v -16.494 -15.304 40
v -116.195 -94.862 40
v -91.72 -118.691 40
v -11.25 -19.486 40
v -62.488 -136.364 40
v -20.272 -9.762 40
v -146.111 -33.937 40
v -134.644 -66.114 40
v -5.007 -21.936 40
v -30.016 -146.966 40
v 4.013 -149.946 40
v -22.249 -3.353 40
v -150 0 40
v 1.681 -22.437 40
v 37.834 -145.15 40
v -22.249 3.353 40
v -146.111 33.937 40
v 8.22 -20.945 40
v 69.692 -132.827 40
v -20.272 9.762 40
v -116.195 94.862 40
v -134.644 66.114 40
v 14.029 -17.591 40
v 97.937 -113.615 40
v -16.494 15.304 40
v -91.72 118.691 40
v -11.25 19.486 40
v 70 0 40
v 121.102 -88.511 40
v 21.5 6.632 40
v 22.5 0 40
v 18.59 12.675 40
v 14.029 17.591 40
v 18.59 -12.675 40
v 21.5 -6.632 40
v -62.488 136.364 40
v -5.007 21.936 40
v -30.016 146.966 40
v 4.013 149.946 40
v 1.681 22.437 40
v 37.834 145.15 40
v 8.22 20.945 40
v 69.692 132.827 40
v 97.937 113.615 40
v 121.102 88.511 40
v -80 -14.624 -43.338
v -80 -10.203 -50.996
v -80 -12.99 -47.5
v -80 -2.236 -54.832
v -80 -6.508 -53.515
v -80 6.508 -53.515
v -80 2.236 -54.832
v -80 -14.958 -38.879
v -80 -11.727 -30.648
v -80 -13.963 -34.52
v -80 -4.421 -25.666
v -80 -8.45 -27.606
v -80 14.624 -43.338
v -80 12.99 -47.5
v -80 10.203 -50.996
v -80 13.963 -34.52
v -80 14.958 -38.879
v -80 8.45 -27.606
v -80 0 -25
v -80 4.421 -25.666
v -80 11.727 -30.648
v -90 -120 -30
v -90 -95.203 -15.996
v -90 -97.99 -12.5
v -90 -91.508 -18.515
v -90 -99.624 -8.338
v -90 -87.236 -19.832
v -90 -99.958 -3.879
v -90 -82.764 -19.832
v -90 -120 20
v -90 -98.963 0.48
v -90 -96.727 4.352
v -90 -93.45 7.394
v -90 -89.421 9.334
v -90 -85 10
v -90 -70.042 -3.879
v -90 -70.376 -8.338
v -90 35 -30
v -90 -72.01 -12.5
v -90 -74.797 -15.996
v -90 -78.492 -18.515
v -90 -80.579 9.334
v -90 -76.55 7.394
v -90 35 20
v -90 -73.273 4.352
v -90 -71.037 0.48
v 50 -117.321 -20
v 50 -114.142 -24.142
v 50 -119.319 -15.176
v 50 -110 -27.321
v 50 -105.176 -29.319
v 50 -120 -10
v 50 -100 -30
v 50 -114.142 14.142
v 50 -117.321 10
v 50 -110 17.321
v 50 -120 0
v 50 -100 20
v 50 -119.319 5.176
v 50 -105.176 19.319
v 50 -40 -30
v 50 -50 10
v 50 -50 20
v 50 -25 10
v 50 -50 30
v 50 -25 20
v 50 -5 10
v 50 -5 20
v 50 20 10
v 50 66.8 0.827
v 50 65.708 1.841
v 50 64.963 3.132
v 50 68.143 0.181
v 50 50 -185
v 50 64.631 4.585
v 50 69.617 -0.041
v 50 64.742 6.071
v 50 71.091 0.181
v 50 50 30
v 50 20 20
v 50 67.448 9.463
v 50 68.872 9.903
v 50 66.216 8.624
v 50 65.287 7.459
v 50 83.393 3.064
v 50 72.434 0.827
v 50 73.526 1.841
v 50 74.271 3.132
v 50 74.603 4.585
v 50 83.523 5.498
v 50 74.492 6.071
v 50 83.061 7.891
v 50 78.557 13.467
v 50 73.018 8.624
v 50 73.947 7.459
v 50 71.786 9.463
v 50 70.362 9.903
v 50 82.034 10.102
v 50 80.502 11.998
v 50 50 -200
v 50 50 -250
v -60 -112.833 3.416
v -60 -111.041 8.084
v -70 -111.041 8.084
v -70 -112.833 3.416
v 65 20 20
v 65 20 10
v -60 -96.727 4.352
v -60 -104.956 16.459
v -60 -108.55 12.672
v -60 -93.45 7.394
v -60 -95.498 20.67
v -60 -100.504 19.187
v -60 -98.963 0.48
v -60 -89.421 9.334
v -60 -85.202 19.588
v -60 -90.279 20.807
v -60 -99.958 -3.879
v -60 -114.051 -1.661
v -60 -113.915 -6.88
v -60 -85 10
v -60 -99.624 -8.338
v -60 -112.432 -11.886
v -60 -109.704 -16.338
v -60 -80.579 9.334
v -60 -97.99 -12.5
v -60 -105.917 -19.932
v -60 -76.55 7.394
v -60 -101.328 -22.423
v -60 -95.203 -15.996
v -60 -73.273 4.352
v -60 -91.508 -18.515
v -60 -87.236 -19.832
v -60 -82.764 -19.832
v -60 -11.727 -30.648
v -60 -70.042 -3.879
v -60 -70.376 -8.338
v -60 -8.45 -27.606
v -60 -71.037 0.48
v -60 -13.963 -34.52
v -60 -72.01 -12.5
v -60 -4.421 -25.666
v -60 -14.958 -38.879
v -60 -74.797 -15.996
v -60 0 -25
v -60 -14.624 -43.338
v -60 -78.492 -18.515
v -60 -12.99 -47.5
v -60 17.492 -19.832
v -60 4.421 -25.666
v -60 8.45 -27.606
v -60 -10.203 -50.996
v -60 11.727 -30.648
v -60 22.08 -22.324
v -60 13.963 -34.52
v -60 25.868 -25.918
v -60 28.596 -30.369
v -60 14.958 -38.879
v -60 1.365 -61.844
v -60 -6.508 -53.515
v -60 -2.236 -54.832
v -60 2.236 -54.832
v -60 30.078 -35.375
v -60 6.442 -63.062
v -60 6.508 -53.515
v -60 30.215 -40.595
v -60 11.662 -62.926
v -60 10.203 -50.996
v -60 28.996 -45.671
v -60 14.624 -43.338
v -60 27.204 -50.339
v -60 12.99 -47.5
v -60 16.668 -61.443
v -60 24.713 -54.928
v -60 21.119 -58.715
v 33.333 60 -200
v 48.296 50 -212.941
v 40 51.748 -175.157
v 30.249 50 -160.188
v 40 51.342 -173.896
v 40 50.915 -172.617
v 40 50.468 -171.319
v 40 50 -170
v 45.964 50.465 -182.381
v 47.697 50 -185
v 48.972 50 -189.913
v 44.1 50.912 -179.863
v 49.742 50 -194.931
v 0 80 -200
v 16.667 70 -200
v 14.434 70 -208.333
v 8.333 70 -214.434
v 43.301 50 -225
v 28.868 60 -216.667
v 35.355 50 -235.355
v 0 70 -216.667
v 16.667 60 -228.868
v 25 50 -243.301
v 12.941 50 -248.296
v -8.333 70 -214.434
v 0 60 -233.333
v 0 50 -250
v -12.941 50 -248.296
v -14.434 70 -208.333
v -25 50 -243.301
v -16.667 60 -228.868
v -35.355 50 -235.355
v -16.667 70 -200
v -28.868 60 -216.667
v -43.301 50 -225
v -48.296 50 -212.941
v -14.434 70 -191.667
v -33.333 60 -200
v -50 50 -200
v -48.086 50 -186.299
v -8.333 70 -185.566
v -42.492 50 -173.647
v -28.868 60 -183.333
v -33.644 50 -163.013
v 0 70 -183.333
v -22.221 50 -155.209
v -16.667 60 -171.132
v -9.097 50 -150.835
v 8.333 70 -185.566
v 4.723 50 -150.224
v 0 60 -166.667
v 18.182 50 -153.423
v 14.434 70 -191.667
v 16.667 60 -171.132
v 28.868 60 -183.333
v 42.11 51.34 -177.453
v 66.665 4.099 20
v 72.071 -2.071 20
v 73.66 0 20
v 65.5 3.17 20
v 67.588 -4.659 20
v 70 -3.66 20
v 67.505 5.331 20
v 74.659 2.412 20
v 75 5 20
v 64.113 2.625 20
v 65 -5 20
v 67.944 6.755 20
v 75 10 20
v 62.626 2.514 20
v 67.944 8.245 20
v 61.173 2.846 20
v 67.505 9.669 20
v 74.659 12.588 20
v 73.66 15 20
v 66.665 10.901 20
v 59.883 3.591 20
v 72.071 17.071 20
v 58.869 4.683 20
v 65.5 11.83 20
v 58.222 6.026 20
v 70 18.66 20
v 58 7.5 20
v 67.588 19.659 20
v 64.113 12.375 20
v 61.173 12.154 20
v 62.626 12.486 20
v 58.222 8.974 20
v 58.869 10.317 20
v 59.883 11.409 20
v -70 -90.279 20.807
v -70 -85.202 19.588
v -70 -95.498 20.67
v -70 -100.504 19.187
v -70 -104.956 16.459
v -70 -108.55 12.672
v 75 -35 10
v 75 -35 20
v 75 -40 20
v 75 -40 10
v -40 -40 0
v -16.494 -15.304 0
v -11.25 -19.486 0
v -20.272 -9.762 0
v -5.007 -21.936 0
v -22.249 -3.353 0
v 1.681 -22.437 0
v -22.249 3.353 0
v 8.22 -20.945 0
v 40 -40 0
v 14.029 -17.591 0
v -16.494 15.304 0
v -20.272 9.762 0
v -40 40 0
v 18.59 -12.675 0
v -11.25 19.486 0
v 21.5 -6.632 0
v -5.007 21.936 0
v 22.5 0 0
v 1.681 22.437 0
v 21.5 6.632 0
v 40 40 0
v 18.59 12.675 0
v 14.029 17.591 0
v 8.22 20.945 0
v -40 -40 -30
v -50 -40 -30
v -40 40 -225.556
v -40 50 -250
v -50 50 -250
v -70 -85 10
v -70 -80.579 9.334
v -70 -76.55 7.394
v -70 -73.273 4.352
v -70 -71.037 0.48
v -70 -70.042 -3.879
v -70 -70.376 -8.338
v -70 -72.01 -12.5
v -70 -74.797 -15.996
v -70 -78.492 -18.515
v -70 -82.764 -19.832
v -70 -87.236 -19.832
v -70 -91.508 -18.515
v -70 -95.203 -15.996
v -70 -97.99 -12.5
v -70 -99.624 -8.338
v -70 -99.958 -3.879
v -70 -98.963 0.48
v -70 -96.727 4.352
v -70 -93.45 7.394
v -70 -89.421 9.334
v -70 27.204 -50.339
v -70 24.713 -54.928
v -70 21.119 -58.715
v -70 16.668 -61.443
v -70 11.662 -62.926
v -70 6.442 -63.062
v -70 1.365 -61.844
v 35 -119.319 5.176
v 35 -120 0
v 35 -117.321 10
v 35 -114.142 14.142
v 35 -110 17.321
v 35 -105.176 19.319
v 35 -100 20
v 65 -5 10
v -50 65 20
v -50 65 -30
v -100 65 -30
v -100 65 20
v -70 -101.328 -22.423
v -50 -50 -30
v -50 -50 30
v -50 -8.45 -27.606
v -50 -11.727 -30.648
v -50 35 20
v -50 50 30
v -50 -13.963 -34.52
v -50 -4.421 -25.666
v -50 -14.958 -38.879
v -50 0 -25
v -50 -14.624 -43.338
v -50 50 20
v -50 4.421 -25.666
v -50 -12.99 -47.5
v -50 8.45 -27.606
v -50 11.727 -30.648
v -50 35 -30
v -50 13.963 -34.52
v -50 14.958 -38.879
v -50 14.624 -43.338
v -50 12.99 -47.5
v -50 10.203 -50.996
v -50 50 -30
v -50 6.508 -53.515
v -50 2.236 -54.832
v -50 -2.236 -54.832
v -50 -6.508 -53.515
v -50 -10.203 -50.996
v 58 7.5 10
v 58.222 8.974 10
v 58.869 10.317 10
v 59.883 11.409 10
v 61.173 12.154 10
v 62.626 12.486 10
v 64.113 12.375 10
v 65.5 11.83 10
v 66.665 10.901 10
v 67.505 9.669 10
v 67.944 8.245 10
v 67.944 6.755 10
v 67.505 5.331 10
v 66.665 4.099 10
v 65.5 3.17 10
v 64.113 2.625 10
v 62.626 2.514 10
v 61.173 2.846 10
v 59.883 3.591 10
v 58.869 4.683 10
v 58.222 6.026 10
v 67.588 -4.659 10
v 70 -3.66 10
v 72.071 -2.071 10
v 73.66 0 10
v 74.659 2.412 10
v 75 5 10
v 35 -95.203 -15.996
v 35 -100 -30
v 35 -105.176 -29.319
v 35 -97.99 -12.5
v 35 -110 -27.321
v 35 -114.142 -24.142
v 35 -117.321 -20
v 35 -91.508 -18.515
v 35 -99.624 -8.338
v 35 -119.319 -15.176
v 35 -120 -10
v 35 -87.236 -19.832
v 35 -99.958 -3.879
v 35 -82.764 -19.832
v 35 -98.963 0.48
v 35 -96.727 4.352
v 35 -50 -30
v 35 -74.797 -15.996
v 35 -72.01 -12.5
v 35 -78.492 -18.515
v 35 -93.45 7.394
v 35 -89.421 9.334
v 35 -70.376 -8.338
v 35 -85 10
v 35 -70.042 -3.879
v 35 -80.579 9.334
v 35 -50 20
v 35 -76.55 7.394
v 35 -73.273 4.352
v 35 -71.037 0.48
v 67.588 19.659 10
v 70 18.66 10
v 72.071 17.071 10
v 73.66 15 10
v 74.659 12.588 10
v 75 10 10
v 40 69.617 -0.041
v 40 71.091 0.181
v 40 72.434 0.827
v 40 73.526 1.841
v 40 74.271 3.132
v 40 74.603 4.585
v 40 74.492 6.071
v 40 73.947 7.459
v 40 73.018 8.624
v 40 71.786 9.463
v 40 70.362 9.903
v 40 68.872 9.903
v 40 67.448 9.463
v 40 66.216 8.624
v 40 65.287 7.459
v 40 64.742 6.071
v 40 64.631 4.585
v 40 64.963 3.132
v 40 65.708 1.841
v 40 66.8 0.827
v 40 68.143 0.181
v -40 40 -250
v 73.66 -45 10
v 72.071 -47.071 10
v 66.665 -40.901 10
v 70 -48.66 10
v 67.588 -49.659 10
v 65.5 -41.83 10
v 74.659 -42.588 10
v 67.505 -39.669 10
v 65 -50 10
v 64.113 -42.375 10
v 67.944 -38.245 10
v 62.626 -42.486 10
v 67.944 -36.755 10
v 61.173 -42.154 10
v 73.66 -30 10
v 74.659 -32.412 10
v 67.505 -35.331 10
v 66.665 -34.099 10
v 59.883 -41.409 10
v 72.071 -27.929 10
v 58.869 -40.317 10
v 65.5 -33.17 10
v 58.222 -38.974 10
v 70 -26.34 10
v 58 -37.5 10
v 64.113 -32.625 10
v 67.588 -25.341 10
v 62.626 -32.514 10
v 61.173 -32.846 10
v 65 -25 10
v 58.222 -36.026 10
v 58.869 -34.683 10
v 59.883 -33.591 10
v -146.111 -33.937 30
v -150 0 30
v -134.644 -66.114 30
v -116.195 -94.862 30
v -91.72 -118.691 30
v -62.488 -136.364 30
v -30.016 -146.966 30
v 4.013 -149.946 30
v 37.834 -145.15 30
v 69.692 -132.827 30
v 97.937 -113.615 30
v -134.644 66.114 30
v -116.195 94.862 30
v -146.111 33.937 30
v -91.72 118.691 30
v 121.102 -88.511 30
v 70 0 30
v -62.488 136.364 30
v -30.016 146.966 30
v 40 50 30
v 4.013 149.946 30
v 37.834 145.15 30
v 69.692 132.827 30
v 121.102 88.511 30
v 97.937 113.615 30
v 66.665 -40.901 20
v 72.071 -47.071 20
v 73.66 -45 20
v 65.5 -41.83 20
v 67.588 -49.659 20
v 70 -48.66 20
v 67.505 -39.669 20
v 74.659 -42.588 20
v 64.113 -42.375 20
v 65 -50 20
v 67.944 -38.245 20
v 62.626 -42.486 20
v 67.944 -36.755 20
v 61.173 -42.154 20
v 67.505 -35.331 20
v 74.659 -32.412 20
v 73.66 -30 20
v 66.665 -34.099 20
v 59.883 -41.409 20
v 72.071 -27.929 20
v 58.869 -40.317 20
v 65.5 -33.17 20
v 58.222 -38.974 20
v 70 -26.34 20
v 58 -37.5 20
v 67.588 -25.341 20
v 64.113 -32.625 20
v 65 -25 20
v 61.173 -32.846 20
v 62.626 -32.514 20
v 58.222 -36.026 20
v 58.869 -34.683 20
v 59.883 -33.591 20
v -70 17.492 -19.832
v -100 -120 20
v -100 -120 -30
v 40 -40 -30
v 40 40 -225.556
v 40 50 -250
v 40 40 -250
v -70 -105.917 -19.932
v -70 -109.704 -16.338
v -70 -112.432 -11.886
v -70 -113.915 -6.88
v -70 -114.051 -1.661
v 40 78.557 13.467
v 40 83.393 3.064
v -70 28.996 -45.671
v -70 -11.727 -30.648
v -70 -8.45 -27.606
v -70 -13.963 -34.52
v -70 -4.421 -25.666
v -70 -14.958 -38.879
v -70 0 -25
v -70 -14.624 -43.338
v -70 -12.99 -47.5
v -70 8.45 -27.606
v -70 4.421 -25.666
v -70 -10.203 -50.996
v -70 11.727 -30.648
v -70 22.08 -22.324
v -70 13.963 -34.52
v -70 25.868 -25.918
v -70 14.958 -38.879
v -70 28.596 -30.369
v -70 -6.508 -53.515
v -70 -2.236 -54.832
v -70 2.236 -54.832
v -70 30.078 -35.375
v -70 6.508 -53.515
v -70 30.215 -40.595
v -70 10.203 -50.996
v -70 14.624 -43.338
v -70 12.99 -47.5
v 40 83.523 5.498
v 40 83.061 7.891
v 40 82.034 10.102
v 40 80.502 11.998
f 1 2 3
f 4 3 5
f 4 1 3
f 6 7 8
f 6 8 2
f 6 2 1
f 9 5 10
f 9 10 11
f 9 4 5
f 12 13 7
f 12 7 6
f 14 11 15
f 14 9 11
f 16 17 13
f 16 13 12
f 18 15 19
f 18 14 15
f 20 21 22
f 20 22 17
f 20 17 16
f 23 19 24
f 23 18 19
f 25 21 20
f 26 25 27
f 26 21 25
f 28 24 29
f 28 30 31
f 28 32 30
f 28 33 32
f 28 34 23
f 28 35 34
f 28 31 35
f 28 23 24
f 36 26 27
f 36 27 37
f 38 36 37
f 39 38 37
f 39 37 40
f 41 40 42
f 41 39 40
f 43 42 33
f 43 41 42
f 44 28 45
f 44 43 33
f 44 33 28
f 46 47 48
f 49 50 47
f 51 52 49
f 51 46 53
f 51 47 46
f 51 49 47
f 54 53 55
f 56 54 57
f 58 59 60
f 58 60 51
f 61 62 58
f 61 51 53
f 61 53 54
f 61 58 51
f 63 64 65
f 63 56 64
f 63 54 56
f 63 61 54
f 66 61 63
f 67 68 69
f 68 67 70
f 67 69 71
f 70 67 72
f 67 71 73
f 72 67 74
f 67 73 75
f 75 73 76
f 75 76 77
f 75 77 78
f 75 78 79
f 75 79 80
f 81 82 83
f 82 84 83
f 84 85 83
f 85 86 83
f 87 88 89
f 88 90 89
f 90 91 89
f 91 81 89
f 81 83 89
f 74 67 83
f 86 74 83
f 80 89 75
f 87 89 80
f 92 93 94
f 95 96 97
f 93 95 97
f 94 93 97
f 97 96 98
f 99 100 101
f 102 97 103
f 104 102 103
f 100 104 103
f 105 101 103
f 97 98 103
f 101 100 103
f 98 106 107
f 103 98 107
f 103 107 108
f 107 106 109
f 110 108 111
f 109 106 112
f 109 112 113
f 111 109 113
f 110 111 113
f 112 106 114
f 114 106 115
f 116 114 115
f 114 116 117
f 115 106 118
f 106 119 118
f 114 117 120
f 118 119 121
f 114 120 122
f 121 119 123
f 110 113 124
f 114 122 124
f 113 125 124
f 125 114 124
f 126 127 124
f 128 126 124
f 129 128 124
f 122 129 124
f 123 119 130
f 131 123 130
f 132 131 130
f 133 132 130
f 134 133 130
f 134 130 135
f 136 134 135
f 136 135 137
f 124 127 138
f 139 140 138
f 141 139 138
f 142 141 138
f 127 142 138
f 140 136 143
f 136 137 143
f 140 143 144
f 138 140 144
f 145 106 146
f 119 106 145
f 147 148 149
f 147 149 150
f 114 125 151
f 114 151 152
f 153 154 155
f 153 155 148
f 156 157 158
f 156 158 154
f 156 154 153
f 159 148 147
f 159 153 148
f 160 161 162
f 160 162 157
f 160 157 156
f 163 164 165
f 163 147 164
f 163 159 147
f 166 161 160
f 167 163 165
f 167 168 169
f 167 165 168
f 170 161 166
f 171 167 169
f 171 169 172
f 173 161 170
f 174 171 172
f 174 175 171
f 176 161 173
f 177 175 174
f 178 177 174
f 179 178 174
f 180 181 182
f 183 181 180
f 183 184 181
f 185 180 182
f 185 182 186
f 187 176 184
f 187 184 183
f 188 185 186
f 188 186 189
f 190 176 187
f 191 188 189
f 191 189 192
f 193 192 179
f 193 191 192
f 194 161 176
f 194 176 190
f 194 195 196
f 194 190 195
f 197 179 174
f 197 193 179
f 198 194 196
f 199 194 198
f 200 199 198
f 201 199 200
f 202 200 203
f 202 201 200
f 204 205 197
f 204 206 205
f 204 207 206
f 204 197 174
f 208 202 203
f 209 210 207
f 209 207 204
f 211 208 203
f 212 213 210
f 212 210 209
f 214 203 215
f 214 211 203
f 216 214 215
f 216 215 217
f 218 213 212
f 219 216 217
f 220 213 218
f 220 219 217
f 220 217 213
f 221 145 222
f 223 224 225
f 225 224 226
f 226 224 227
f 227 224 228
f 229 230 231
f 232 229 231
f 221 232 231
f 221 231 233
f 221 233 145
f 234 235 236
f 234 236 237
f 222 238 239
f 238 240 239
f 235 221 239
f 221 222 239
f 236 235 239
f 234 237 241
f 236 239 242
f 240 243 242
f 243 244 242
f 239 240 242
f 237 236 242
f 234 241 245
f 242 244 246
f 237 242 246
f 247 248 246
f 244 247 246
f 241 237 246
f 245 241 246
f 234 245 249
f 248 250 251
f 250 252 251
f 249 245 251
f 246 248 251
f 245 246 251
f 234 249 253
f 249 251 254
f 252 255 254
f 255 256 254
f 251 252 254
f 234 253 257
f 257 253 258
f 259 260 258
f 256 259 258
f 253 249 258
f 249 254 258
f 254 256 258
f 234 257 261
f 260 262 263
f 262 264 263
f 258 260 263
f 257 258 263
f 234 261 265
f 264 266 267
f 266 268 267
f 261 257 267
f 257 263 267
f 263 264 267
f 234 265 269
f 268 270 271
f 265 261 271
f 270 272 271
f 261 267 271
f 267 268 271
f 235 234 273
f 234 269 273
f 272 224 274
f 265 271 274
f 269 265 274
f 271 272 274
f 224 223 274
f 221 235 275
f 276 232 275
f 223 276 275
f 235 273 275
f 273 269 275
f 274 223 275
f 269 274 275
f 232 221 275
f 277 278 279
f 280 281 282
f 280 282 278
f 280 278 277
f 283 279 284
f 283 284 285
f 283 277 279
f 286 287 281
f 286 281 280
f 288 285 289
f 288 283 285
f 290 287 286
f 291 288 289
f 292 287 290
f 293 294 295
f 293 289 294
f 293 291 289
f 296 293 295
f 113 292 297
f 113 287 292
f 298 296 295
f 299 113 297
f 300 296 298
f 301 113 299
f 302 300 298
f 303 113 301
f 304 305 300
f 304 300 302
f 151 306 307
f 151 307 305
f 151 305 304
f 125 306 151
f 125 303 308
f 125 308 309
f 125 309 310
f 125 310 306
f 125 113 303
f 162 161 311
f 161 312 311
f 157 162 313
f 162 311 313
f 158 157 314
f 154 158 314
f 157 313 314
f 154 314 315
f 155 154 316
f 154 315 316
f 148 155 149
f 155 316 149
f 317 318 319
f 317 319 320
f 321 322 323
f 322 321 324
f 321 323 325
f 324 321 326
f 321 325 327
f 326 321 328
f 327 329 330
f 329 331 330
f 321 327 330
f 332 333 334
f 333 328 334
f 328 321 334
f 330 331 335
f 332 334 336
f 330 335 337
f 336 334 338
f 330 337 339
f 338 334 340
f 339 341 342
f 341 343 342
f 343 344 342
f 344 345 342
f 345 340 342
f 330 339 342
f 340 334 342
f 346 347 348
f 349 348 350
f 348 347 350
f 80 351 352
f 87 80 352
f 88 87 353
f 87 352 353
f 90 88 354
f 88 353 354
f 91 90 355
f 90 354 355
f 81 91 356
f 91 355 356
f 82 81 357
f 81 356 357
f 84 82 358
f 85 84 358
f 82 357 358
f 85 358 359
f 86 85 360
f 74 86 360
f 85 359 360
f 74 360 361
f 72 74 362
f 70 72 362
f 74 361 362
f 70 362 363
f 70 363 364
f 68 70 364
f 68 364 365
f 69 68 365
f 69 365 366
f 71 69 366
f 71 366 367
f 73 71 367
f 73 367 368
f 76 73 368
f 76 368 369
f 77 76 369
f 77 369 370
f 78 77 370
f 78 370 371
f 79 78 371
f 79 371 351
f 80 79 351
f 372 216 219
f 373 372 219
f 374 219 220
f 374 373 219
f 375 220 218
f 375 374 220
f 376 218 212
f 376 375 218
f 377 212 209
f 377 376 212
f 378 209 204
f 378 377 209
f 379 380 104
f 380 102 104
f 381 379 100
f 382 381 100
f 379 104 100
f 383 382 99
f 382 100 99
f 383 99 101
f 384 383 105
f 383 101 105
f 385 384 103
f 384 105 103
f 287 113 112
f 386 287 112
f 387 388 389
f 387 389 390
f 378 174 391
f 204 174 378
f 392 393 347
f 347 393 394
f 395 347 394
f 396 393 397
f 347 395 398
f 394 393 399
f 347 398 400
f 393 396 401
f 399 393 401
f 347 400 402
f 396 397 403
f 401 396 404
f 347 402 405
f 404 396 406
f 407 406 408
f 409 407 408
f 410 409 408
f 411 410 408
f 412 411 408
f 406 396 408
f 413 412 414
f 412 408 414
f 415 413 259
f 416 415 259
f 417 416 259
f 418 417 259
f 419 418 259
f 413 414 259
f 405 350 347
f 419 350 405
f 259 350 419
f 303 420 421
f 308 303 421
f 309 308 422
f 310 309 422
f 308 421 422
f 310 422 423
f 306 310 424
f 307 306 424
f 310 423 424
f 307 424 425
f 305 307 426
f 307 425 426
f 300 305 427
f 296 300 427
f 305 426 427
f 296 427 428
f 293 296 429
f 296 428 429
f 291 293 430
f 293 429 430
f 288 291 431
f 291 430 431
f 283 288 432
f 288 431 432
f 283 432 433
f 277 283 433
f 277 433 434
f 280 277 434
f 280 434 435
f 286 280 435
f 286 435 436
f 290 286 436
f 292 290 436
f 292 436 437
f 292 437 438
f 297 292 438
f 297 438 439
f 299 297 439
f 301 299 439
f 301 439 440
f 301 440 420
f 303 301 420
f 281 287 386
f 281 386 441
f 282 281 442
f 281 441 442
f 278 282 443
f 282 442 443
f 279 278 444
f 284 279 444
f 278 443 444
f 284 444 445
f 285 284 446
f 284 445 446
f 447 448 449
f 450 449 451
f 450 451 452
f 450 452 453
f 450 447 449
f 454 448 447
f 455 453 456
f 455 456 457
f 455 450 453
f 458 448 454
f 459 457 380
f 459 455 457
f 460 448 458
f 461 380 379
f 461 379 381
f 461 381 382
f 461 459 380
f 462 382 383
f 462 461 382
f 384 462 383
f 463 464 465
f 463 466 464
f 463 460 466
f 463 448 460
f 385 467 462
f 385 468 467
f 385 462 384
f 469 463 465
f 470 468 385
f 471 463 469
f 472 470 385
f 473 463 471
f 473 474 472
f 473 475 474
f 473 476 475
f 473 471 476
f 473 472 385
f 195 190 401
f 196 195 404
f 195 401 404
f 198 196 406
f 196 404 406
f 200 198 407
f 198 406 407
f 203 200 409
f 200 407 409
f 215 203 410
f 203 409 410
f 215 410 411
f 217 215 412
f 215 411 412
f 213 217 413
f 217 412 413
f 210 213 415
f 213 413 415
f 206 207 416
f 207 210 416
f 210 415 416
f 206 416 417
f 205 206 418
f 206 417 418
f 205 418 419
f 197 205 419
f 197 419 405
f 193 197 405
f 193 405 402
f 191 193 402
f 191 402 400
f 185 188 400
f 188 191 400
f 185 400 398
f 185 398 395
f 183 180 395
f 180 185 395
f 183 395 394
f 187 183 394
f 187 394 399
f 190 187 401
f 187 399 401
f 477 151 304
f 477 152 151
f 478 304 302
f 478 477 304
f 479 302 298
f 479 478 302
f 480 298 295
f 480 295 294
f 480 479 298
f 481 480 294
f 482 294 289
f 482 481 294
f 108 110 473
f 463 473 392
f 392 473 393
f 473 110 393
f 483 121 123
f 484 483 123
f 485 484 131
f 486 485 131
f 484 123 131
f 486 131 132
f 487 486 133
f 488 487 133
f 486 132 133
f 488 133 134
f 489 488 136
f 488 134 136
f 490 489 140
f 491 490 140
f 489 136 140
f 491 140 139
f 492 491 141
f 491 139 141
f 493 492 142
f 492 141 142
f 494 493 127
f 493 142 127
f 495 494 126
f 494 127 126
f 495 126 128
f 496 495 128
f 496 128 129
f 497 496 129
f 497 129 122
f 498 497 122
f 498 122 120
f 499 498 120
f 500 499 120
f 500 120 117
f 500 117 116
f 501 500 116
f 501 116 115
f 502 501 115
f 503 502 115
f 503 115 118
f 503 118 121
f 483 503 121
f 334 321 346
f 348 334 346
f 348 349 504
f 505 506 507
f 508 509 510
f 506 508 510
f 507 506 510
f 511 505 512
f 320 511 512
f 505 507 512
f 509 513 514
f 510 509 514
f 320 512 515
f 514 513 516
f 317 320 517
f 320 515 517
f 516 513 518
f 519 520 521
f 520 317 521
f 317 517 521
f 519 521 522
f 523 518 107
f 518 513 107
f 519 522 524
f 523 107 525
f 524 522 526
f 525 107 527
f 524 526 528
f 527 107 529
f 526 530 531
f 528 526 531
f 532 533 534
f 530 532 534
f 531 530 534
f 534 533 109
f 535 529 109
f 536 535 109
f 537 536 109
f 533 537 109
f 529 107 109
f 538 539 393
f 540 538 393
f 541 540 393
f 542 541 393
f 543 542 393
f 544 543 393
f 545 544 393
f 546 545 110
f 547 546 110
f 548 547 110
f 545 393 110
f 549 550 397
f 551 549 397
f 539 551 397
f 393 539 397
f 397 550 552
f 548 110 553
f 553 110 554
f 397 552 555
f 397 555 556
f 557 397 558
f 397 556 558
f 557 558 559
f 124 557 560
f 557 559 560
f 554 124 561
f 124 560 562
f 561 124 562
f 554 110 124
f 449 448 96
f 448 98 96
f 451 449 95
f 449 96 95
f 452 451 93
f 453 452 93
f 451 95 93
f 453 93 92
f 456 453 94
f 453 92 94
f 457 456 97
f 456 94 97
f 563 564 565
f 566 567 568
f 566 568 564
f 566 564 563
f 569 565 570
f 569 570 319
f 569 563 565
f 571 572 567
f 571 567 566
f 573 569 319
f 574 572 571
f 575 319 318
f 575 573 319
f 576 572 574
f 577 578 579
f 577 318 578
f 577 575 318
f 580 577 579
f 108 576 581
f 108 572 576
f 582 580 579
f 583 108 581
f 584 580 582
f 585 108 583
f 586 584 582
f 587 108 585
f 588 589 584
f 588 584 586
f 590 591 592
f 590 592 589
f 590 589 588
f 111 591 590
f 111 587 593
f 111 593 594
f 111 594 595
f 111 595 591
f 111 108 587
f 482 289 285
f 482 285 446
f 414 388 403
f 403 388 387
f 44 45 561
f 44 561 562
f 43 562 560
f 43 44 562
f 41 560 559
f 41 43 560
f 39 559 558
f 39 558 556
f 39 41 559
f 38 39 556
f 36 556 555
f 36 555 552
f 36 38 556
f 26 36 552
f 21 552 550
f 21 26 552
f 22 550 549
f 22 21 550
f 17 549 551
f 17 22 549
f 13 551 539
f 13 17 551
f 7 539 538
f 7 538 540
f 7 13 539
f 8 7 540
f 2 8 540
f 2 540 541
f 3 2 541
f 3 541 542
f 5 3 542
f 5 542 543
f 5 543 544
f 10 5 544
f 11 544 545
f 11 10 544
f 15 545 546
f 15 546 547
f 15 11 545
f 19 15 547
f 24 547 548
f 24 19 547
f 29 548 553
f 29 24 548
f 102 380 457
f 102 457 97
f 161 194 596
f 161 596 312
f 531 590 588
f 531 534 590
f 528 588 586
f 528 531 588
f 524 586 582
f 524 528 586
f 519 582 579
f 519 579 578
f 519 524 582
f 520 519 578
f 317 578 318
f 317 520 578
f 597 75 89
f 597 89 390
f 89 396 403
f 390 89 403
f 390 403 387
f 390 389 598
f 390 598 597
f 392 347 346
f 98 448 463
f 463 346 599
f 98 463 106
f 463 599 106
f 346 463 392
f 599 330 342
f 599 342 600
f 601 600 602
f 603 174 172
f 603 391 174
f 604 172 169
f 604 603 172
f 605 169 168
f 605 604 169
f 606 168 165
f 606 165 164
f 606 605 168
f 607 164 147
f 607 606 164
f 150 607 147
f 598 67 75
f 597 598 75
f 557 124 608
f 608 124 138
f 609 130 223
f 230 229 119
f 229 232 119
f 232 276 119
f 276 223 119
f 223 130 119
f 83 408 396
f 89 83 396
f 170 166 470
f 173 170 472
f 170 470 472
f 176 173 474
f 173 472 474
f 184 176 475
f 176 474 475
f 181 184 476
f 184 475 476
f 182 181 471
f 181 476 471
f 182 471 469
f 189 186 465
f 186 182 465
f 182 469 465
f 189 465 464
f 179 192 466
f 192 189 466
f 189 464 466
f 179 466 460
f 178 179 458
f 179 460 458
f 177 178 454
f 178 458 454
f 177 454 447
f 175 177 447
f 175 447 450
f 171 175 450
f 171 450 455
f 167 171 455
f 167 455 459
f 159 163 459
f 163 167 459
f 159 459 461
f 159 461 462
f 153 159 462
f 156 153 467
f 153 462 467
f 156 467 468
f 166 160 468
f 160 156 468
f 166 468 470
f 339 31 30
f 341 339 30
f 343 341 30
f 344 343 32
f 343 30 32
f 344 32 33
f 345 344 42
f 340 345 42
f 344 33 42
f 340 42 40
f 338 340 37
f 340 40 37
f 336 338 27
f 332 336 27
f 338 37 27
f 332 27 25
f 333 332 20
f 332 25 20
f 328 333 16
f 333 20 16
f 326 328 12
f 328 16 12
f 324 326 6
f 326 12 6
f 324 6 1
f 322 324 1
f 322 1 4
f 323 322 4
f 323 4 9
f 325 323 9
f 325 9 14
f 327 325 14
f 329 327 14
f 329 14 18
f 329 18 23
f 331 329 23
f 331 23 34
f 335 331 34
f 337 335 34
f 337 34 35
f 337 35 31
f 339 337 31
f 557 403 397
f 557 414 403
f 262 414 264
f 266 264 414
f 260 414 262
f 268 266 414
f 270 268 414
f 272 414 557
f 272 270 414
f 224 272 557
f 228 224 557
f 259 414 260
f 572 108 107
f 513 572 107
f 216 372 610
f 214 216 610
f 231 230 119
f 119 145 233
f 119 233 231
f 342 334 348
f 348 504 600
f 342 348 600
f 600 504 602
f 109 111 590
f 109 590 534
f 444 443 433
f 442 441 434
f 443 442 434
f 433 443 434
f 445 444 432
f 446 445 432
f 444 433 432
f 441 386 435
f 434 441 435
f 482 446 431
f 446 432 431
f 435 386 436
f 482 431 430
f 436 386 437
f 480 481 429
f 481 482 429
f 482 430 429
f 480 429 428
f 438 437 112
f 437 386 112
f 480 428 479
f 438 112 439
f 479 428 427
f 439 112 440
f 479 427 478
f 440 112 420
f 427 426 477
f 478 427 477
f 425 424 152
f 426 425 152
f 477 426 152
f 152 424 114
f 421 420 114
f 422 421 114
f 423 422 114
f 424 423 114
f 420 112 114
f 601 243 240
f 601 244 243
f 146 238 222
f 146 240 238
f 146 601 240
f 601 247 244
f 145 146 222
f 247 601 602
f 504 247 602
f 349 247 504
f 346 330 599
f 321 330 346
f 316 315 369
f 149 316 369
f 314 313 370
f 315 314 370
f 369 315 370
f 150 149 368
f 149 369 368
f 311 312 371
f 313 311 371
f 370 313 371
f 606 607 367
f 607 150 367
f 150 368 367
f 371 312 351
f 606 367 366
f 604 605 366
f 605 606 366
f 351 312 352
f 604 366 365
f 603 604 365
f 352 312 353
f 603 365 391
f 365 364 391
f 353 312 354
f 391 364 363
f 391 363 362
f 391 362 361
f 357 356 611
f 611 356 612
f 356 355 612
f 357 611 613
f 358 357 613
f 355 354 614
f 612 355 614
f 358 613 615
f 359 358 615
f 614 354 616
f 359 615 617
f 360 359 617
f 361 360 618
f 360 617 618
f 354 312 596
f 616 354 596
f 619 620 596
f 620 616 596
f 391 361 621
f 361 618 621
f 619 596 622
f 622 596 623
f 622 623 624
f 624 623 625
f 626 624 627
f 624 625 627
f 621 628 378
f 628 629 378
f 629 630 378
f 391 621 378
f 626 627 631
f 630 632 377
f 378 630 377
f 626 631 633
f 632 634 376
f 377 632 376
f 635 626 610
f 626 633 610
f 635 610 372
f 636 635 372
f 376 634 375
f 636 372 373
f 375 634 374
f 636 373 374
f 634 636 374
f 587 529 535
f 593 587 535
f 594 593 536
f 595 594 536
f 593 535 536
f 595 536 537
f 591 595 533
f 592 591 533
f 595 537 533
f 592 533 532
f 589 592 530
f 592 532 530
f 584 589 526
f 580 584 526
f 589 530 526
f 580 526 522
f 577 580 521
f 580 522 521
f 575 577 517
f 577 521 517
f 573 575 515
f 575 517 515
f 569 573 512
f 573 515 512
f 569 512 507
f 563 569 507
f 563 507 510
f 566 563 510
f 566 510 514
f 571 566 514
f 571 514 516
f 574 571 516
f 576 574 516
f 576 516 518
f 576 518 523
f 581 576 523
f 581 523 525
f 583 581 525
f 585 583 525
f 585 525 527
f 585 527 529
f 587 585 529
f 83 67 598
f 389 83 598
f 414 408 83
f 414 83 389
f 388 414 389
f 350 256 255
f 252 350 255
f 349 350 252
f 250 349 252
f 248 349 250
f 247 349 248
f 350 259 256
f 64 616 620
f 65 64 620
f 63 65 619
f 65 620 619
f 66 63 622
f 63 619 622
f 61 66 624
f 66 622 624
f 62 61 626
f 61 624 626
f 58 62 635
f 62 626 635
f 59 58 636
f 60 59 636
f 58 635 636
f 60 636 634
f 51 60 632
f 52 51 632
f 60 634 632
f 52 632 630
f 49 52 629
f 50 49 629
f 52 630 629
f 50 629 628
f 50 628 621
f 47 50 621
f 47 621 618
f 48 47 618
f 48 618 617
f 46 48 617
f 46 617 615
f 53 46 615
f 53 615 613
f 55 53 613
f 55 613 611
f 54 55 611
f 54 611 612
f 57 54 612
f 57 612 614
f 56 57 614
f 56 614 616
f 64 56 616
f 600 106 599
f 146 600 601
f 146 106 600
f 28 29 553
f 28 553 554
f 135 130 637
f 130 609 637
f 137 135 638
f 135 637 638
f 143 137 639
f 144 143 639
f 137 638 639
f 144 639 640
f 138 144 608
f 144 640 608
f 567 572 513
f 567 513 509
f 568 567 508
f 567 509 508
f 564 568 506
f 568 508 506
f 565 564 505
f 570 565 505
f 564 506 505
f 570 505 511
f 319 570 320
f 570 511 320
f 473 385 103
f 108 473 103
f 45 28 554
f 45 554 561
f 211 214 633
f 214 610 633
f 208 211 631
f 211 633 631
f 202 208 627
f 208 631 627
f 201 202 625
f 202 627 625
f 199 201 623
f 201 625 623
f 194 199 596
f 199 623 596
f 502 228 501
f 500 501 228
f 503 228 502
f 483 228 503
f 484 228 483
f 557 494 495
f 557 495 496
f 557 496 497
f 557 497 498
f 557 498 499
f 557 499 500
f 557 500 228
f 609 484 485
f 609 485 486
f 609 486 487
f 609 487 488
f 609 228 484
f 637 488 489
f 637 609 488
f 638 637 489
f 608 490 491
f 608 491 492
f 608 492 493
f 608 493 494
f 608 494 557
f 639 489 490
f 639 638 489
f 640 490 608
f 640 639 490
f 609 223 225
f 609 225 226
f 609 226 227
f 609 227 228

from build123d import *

# Parameters (mm, degrees)
SZKIC1_W                     = 100
SZKIC1_H                     = 100
DODANIE_WYCI_GNI_CIE1_DEPTH  = 40
SZKIC3_R                     = 22.5
WYTNIJ_WYCI_GNI_CIE1_DEPTH   = 41
SZKIC4_W                     = 100
SZKIC4_H                     = 10
DODANIE_WYCI_GNI_CIE2_DEPTH  = 30
DODANIE_WYCI_GNI_CIE3_DEPTH  = 10
DODANIE_WYCI_GNI_CIE4_DEPTH  = 10
DODANIE_WYCI_GNI_CIE5_DEPTH  = 10
SZKIC11_W                    = 15
SZKIC11_H                    = 50
DODANIE_WYCI_GNI_CIE6_DEPTH  = 70
SZKIC12_R                    = 15
DODANIE_WYCI_GNI_CIE7_DEPTH  = 125
SZKIC13_R                    = 15
DODANIE_WYCI_GNI_CIE8_DEPTH  = 30
DODANIE_WYCI_GNI_CIE9_DEPTH  = 10
ZAOKR_GLENIE1_R              = 20
SZKIC15_W                    = 50
SZKIC15_H                    = 185
DODANIE_WYCI_GNI_CIE10_DEPTH = 10
DODANIE_WYCI_GNI_CIE11_REACH = 52
SZKIC17_W                    = 50
SZKIC17_H                    = 30
SZKIC18_W                    = 100
SZKIC18_H                    = 100
DODANIE_WYCI_GNI_CIE12_DEPTH = 10
DODANIE_WYCI_GNI_CIE13_DEPTH = 10
WYTNIJ_WYCI_GNI_CIE2_REACH   = 202
SZKIC20_R                    = 5
SZKIC21_W                    = 10
SZKIC21_H                    = 25
DODANIE_WYCI_GNI_CIE14_DEPTH = 25
ZAOKR_GLENIE2_R              = 10
WYTNIJ_WYCI_GNI_CIE3_REACH   = 32
SZKIC22_R                    = 5


with BuildPart() as part:
    # Szkic1 → Dodanie-wyciągnięcie1 (new body)
    with BuildSketch(Plane.XY):
        Rectangle(SZKIC1_W, SZKIC1_H)
    extrude(amount=DODANIE_WYCI_GNI_CIE1_DEPTH)

    # Szkic3 → Wytnij-wyciągnięcie1 (cut, through all)
    with BuildSketch(Plane.XY.offset(40)):
        Circle(SZKIC3_R)
    extrude(amount=-WYTNIJ_WYCI_GNI_CIE1_DEPTH, mode=Mode.SUBTRACT)

    # Szkic4 → Dodanie-wyciągnięcie2 (add)
    with BuildSketch(Plane(origin=(0, 0, 0), x_dir=(-1, 0, 0), z_dir=(0, 0, -1))):
        with Locations((0, -45)):
            Rectangle(SZKIC4_W, SZKIC4_H)
    extrude(amount=DODANIE_WYCI_GNI_CIE2_DEPTH)

    # Szkic5 → Dodanie-wyciągnięcie3 (add)
    with BuildSketch(Plane.ZY.offset(50)):
        Polygon((-30, -40), (-250, 50), (0, 50), (0, -40), align=None)
    extrude(amount=-DODANIE_WYCI_GNI_CIE3_DEPTH)

    # Szkic6 → Dodanie-wyciągnięcie4 (add)
    with BuildSketch(Plane(origin=(50, 0, 0), x_dir=(0, 0, -1), z_dir=(1, 0, 0))):
        Polygon((30, -40), (250, 50), (0, 50), (0, -40), align=None)
    extrude(amount=-DODANIE_WYCI_GNI_CIE4_DEPTH)

    # Szkic7 → Dodanie-wyciągnięcie5 (add)
    with BuildSketch(Plane(origin=(0, 50, 0), x_dir=(1, 0, 0), z_dir=(0, 1, 0))):
        Polygon((40, 250), (-40, 250), (-40, 30), (-40, 0), (40, 0), align=None)
    extrude(amount=-DODANIE_WYCI_GNI_CIE5_DEPTH)

    # Szkic10 → Obrót1 (revolve)
    with BuildSketch(Plane(origin=(0, 0, -200), x_dir=(-1, 0, 0), z_dir=(0, 0, -1))):
        Polygon((0, 50), (0, 80), (-50, 50), align=None)
    revolve(axis=Axis((0, 50, -200), (0, 1, 0)))

    # Szkic11 → Dodanie-wyciągnięcie6 (add)
    with BuildSketch(Plane.XZ.offset(50)):
        with Locations((42.5, -5)):
            Rectangle(SZKIC11_W, SZKIC11_H)
    extrude(amount=DODANIE_WYCI_GNI_CIE6_DEPTH)

    # Szkic12 → Dodanie-wyciągnięcie7 (add)
    with BuildSketch(Plane.ZY.offset(-35)):
        with Locations((-5, -85)):
            Circle(SZKIC12_R)
    extrude(amount=DODANIE_WYCI_GNI_CIE7_DEPTH)

    # Szkic13 → Dodanie-wyciągnięcie8 (add)
    with BuildSketch(Plane.ZY.offset(50)):
        with Locations((-40, 0)):
            Circle(SZKIC13_R)
    extrude(amount=DODANIE_WYCI_GNI_CIE8_DEPTH)

    # Szkic14 → Dodanie-wyciągnięcie9 (add)
    with BuildSketch(Plane.ZY.offset(60)):
        Polygon((-69.010894517, 20.037063975), (-26.999775325, 36.163621704), (26.755417107, -103.87344227), (-15.255702085, -120), align=None)
    extrude(amount=DODANIE_WYCI_GNI_CIE9_DEPTH)

    # Zaokrąglenie1
    zaokr_glenie1_edges = [part.edges().sort_by_distance(p)[0] for p in [
        (-65, 20.037063975, -69.010894517),
        (-65, -120, -15.255702085),
        (-65, -103.87344227, 26.755417107),
        (-65, 36.163621704, -26.999775325),
        (42.5, -120, 20),
        (42.5, -120, -30),
    ]]
    fillet(zaokr_glenie1_edges, radius=ZAOKR_GLENIE1_R)

    # Szkic15 → Dodanie-wyciągnięcie10 (add)
    with BuildSketch(Plane.ZY.offset(90)):
        with Locations((-5, -27.5)):
            Rectangle(SZKIC15_W, SZKIC15_H)
    extrude(amount=DODANIE_WYCI_GNI_CIE10_DEPTH)

    # Szkic17 → Dodanie-wyciągnięcie11 (add, up to next)
    with BuildSketch(Plane.ZY.offset(50), mode=Mode.PRIVATE) as dodanie_wyci_gni_cie11_sk1:
        with Locations((-5, 50)):
            Rectangle(SZKIC17_W, SZKIC17_H)
    dodanie_wyci_gni_cie11_tool1 = extrude(dodanie_wyci_gni_cie11_sk1.sketch, amount=DODANIE_WYCI_GNI_CIE11_REACH, mode=Mode.PRIVATE) - part.part
    add(dodanie_wyci_gni_cie11_tool1.solids().sort_by_distance((-50, 50, -5))[0])

    # Szkic18 → Dodanie-wyciągnięcie12 (add)
    with BuildSketch(Plane.XY.offset(40)):
        with BuildLine():
            Line((70, 0), (121.10211367, 88.511457251))
            ThreePointArc((121.10211367, 88.511457251), (-150, 0), (121.10211367, -88.511457251))
            Line((121.10211367, -88.511457251), (70, 0))
        make_face()
        Rectangle(SZKIC18_W, SZKIC18_H, mode=Mode.SUBTRACT)
    extrude(amount=-DODANIE_WYCI_GNI_CIE12_DEPTH)

    # Szkic19 → Dodanie-wyciągnięcie13 (add)
    with BuildSketch(Plane(origin=(50, 0, 0), x_dir=(0, 0, -1), z_dir=(1, 0, 0))):
        Polygon((-30, 50), (-9.958560776, 84.617058134), (185, 50), align=None)
    extrude(amount=-DODANIE_WYCI_GNI_CIE13_DEPTH)

    # Szkic20 → Wytnij-wyciągnięcie2 (cut, up to next)
    with BuildSketch(Plane(origin=(50, 0, 0), x_dir=(0, 0, -1), z_dir=(1, 0, 0)), mode=Mode.PRIVATE) as wytnij_wyci_gni_cie2_sk1:
        with Locations((-4.958560776, 69.617058134)):
            Circle(SZKIC20_R)
    wytnij_wyci_gni_cie2_tool1 = extrude(wytnij_wyci_gni_cie2_sk1.sketch, amount=-WYTNIJ_WYCI_GNI_CIE2_REACH, mode=Mode.PRIVATE) & part.part
    add(wytnij_wyci_gni_cie2_tool1.solids().sort_by_distance((50, 69.617058, 4.958561))[0], mode=Mode.SUBTRACT)

    # Szkic21 → Dodanie-wyciągnięcie14 (add)
    with BuildSketch(Plane(origin=(50, 0, 0), x_dir=(0, 0, -1), z_dir=(1, 0, 0))):
        with Locations((-15, 7.5)):
            Rectangle(SZKIC21_W, SZKIC21_H)
        with Locations((-15, -37.5)):
            Rectangle(SZKIC21_W, SZKIC21_H)
    extrude(amount=DODANIE_WYCI_GNI_CIE14_DEPTH)

    # Zaokrąglenie2
    zaokr_glenie2_edges = [part.edges().sort_by_distance(p)[0] for p in [
        (45, 84.617058134, 9.958560776),
        (75, 20, 15),
        (75, -5, 15),
        (75, -25, 15),
        (75, -50, 15),
    ]]
    fillet(zaokr_glenie2_edges, radius=ZAOKR_GLENIE2_R)

    # Szkic22 → Wytnij-wyciągnięcie3 (cut, up to next)
    with BuildSketch(Plane(origin=(0, 0, 10), x_dir=(-1, 0, 0), z_dir=(0, 0, -1)), mode=Mode.PRIVATE) as wytnij_wyci_gni_cie3_sk1:
        with Locations((-63, 7.5)):
            Circle(SZKIC22_R)
    wytnij_wyci_gni_cie3_tool1 = extrude(wytnij_wyci_gni_cie3_sk1.sketch, amount=-WYTNIJ_WYCI_GNI_CIE3_REACH, mode=Mode.PRIVATE) & part.part
    add(wytnij_wyci_gni_cie3_tool1.solids().sort_by_distance((63, 7.5, 10))[0], mode=Mode.SUBTRACT)
    # Szkic22 → Wytnij-wyciągnięcie3 (cut, up to next)
    with BuildSketch(Plane(origin=(0, 0, 10), x_dir=(-1, 0, 0), z_dir=(0, 0, -1)), mode=Mode.PRIVATE) as wytnij_wyci_gni_cie3_sk2:
        with Locations((-63, -37.5)):
            Circle(SZKIC22_R)
    wytnij_wyci_gni_cie3_tool2 = extrude(wytnij_wyci_gni_cie3_sk2.sketch, amount=-WYTNIJ_WYCI_GNI_CIE3_REACH, mode=Mode.PRIVATE) & part.part
    add(wytnij_wyci_gni_cie3_tool2.solids().sort_by_distance((63, -37.5, 10))[0], mode=Mode.SUBTRACT)


solid = part.part
